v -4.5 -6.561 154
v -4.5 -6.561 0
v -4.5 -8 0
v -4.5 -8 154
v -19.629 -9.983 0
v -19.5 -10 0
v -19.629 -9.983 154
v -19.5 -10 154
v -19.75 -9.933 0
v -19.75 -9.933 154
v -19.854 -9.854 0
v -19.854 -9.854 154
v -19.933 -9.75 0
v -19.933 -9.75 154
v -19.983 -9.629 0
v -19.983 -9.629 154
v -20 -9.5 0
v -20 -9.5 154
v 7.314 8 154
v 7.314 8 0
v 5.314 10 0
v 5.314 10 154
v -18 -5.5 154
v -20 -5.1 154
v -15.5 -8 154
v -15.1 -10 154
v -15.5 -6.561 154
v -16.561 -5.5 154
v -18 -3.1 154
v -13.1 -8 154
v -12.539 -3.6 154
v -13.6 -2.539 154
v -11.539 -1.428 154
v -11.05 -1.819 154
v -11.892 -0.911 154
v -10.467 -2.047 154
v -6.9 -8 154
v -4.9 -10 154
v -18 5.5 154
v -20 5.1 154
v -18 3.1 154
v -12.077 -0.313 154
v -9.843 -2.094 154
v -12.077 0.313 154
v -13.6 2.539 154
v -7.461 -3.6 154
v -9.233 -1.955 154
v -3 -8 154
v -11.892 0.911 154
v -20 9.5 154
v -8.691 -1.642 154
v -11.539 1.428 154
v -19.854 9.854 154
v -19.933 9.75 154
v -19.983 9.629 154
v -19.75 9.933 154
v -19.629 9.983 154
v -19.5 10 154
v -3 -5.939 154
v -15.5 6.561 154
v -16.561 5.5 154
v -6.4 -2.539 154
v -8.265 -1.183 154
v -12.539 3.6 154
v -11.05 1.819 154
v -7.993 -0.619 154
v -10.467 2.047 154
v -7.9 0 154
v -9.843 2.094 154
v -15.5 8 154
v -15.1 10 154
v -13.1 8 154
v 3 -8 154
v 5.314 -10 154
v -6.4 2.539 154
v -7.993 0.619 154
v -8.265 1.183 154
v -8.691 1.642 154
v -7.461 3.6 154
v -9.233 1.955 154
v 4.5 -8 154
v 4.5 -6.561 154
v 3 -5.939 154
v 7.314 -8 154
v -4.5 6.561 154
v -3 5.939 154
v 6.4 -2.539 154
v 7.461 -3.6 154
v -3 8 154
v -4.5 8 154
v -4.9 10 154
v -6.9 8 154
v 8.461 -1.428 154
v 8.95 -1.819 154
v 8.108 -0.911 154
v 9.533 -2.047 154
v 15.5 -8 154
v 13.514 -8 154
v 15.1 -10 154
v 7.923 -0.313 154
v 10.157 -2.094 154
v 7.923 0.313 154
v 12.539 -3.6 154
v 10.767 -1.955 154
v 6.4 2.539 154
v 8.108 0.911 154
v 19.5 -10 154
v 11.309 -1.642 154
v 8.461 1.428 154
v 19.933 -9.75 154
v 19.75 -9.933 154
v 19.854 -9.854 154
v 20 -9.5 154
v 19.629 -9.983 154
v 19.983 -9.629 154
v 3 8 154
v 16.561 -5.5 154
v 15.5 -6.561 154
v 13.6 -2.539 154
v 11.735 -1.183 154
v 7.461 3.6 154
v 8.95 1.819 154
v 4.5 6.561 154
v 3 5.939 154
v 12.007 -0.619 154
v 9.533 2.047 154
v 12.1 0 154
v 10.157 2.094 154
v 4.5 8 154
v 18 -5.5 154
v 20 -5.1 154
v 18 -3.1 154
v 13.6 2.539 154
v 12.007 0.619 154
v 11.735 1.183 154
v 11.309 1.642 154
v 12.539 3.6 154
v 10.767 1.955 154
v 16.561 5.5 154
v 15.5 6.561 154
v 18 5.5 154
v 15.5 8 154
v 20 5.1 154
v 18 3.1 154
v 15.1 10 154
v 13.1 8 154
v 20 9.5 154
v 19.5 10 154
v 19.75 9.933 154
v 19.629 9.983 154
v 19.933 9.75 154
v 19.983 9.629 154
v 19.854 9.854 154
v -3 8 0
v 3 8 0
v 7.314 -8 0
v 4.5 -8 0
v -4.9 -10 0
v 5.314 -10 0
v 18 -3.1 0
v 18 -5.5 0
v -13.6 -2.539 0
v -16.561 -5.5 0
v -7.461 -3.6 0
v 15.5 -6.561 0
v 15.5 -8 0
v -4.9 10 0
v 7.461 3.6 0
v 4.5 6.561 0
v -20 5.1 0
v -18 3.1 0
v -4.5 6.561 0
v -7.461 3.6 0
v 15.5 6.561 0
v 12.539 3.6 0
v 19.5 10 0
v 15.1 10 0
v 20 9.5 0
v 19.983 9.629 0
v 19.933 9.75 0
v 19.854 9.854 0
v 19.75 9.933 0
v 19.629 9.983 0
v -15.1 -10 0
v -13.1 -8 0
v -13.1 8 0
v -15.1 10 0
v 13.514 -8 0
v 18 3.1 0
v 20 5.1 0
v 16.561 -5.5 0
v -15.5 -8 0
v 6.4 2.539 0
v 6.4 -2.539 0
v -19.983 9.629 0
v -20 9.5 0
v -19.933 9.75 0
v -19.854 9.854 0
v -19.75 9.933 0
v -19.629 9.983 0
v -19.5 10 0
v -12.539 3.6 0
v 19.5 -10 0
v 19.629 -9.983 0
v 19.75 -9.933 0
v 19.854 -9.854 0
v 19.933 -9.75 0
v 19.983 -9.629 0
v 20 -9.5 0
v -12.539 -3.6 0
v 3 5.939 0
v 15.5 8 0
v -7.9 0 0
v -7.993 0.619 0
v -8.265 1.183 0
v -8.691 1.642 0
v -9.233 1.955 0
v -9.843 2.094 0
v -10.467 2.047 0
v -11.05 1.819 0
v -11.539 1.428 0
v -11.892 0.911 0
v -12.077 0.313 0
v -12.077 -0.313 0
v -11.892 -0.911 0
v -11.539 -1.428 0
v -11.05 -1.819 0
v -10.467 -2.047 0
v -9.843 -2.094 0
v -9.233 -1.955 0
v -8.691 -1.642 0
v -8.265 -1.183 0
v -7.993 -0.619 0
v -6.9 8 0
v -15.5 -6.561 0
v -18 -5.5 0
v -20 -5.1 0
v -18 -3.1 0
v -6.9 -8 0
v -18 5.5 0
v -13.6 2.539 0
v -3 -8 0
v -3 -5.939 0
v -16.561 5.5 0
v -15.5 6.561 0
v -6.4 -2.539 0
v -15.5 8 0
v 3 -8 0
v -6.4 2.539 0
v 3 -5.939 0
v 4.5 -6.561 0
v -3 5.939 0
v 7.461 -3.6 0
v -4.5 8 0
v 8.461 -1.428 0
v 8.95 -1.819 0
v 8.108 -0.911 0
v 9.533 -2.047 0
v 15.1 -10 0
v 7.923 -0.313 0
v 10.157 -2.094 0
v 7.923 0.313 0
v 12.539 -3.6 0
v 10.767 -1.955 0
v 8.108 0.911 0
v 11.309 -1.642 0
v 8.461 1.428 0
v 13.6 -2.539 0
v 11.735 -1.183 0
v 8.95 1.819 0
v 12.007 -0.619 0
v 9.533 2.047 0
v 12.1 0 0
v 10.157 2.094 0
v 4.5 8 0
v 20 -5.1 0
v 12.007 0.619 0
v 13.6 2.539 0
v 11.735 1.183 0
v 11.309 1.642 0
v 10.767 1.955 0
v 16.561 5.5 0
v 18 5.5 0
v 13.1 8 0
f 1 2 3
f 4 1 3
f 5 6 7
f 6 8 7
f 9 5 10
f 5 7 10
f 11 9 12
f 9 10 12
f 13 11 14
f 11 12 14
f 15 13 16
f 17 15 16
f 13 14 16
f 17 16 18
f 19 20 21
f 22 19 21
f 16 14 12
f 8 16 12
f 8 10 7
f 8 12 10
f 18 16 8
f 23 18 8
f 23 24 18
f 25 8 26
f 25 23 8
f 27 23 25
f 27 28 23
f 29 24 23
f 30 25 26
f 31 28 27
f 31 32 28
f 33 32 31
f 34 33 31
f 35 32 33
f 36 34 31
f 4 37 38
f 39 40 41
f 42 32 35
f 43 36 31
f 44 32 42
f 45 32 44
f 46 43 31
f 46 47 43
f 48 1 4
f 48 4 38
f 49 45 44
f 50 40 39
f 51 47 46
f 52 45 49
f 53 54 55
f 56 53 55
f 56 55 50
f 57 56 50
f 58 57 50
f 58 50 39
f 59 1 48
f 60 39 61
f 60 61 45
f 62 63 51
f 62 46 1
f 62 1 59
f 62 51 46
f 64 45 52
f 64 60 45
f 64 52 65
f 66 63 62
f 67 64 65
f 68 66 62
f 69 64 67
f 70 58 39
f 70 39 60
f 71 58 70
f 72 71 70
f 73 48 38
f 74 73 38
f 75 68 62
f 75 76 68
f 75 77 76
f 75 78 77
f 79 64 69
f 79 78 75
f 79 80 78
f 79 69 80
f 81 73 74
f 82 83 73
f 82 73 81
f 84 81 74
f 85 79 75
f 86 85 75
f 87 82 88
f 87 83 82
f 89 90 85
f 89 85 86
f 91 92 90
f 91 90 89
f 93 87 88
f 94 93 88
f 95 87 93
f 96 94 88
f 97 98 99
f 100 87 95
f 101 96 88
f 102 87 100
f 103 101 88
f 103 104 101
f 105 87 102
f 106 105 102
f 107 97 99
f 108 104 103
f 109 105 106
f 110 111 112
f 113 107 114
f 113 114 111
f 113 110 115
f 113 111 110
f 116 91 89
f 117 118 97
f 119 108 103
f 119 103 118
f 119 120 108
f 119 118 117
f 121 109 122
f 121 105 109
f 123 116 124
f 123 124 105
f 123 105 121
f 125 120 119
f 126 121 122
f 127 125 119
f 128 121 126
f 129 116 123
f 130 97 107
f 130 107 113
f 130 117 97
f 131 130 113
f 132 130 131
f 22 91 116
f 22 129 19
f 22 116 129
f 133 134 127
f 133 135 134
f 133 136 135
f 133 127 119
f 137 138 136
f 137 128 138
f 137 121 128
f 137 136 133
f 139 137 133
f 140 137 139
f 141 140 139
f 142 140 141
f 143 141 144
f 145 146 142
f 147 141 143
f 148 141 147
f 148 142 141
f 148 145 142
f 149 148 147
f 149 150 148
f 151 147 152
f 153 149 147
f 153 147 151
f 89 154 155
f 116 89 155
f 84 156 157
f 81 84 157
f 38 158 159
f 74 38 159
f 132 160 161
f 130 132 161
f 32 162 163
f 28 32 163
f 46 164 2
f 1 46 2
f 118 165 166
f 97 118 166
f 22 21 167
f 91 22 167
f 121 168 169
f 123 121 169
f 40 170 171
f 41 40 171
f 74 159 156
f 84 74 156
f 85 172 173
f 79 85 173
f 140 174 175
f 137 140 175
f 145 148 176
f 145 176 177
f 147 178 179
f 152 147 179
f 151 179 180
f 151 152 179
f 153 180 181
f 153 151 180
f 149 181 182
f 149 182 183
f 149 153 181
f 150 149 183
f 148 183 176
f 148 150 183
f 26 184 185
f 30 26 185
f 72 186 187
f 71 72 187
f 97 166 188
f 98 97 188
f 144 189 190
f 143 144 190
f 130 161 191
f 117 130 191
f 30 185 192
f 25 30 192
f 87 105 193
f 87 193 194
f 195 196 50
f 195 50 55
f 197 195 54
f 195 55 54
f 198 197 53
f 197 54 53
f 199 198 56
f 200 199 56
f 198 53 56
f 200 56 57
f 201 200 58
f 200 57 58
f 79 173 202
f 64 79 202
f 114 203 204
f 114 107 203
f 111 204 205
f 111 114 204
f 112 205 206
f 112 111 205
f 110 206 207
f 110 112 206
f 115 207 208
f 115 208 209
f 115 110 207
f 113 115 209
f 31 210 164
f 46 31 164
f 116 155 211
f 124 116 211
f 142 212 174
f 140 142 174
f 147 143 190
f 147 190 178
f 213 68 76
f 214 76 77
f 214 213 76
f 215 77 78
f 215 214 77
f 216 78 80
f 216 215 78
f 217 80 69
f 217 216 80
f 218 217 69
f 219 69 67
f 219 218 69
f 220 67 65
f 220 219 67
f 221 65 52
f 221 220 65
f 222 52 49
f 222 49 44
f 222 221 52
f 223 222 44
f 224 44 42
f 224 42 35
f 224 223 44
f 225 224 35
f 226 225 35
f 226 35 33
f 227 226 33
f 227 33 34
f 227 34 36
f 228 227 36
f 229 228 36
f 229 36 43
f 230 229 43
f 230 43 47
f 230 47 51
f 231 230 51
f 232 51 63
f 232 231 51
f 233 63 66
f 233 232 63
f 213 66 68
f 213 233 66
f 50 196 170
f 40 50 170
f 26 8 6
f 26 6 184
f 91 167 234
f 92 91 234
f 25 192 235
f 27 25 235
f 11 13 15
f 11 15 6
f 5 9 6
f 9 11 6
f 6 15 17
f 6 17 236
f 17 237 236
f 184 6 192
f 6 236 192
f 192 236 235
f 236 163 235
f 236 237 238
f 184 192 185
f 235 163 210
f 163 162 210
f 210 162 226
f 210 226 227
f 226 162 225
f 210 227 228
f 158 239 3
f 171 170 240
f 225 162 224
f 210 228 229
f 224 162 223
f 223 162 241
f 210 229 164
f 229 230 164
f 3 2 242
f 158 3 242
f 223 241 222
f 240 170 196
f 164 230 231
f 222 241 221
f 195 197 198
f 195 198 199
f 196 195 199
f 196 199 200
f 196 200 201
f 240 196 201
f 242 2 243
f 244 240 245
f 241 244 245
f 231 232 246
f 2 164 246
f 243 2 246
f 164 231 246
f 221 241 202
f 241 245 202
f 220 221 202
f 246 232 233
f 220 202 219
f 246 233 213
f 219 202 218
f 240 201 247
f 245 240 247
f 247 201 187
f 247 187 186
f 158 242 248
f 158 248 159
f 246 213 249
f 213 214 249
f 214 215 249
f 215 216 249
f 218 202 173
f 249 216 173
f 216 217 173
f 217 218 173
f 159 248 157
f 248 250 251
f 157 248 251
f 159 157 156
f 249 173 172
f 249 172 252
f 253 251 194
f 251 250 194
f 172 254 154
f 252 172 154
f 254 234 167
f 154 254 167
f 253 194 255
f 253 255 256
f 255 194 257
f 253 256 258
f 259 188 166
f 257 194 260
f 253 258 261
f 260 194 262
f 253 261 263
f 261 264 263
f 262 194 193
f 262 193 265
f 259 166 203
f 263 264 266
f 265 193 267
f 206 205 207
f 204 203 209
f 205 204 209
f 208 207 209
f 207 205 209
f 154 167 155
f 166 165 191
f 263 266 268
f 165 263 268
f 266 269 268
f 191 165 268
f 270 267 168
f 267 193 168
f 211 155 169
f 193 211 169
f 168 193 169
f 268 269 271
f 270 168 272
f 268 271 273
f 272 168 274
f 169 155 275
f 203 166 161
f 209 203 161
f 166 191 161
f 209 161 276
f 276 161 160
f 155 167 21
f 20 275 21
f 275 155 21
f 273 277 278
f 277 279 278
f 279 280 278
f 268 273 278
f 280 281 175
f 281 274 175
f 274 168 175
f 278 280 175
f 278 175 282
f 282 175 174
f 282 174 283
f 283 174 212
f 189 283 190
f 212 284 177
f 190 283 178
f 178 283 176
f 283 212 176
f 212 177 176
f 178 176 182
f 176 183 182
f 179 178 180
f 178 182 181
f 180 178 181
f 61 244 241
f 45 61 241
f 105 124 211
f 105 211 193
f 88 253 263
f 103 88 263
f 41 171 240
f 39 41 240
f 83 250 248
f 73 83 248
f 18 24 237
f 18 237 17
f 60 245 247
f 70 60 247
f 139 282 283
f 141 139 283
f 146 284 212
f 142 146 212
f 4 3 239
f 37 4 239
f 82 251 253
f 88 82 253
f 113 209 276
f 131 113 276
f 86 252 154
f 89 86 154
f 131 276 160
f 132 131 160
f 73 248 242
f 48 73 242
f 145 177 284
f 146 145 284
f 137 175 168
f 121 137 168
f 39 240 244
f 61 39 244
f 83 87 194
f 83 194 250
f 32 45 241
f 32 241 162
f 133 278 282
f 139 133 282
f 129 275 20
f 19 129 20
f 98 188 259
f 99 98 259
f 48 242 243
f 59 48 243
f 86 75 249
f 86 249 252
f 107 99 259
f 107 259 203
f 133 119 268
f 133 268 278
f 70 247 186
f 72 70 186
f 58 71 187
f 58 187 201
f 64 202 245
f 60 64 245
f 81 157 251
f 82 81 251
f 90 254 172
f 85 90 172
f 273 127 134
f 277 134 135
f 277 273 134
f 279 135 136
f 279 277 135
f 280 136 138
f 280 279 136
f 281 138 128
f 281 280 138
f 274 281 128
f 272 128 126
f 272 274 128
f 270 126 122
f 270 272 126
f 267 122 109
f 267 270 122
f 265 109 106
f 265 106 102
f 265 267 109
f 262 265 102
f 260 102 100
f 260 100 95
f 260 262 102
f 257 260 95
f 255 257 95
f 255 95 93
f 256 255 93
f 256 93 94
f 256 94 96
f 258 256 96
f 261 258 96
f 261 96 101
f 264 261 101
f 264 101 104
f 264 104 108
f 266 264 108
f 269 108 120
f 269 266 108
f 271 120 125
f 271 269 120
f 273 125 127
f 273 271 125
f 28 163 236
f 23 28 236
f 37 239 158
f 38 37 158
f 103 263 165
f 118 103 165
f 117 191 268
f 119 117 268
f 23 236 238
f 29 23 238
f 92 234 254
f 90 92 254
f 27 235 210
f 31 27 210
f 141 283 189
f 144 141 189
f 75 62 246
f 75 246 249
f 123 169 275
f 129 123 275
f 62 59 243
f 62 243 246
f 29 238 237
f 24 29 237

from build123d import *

# Parameters (mm, degrees)
SKETCH1_R           = 2.1
BOSS_EXTRUDE1_DEPTH = 154
FILLET1_R           = 0.5


with BuildPart() as part:
    # Sketch1 → Boss-Extrude1 (new body)
    with BuildSketch(Plane.XY):
        Polygon((-20, -10), (-15.5, -10), (-15.1, -10), (-13.1, -8), (-15.5, -8), (-15.5, -6.560660172), (-12.539339828, -3.6), (-7.460660172, -3.6), (-4.5, -6.560660172), (-4.5, -8), (-6.9, -8), (-4.9, -10), (5.313777138, -10), (7.313777138, -8), (4.5, -8), (4.5, -6.560660172), (7.460660172, -3.6), (12.539339828, -3.6), (15.5, -6.560660172), (15.5, -8), (13.513777138, -8), (15.1, -10), (15.5, -10), (20, -10), (20, -5.5), (20, -5.1), (18, -3.1), (18, -5.5), (16.560660172, -5.5), (13.6, -2.539339828), (13.6, 2.539339828), (16.560660172, 5.5), (18, 5.5), (18, 3.1), (20, 5.1), (20, 5.5), (20, 10), (15.5, 10), (15.1, 10), (13.1, 8), (15.5, 8), (15.5, 6.560660172), (12.539339828, 3.6), (7.460660172, 3.6), (4.5, 6.560660172), (4.5, 8), (7.313777138, 8), (5.313777138, 10), (-4.9, 10), (-6.9, 8), (-4.5, 8), (-4.5, 6.560660172), (-7.460660172, 3.6), (-12.539339828, 3.6), (-15.5, 6.560660172), (-15.5, 8), (-13.1, 8), (-15.1, 10), (-15.5, 10), (-20, 10), (-20, 5.5), (-20, 5.1), (-18, 3.1), (-18, 5.5), (-16.560660172, 5.5), (-13.6, 2.539339828), (-13.6, -2.539339828), (-16.560660172, -5.5), (-18, -5.5), (-18, -3.1), (-20, -5.1), (-20, -5.5), align=None)
        with Locations((-10, 0)):
            Circle(SKETCH1_R, mode=Mode.SUBTRACT)
        with Locations((10, 0)):
            Circle(SKETCH1_R, mode=Mode.SUBTRACT)
        Polygon((3, -5.939339828), (3, -8), (-3, -8), (-3, -5.939339828), (-6.4, -2.539339828), (-6.4, 2.539339828), (-3, 5.939339828), (-3, 8), (3, 8), (3, 5.939339828), (6.4, 2.539339828), (6.4, -2.539339828), align=None, mode=Mode.SUBTRACT)
    extrude(amount=BOSS_EXTRUDE1_DEPTH)

    # Fillet1
    fillet1_edges = [part.edges().sort_by_distance(p)[0] for p in [
        (-20, 10, 77),
        (20, 10, 77),
        (20, -10, 77),
        (-20, -10, 77),
    ]]
    fillet(fillet1_edges, radius=FILLET1_R)


solid = part.part
